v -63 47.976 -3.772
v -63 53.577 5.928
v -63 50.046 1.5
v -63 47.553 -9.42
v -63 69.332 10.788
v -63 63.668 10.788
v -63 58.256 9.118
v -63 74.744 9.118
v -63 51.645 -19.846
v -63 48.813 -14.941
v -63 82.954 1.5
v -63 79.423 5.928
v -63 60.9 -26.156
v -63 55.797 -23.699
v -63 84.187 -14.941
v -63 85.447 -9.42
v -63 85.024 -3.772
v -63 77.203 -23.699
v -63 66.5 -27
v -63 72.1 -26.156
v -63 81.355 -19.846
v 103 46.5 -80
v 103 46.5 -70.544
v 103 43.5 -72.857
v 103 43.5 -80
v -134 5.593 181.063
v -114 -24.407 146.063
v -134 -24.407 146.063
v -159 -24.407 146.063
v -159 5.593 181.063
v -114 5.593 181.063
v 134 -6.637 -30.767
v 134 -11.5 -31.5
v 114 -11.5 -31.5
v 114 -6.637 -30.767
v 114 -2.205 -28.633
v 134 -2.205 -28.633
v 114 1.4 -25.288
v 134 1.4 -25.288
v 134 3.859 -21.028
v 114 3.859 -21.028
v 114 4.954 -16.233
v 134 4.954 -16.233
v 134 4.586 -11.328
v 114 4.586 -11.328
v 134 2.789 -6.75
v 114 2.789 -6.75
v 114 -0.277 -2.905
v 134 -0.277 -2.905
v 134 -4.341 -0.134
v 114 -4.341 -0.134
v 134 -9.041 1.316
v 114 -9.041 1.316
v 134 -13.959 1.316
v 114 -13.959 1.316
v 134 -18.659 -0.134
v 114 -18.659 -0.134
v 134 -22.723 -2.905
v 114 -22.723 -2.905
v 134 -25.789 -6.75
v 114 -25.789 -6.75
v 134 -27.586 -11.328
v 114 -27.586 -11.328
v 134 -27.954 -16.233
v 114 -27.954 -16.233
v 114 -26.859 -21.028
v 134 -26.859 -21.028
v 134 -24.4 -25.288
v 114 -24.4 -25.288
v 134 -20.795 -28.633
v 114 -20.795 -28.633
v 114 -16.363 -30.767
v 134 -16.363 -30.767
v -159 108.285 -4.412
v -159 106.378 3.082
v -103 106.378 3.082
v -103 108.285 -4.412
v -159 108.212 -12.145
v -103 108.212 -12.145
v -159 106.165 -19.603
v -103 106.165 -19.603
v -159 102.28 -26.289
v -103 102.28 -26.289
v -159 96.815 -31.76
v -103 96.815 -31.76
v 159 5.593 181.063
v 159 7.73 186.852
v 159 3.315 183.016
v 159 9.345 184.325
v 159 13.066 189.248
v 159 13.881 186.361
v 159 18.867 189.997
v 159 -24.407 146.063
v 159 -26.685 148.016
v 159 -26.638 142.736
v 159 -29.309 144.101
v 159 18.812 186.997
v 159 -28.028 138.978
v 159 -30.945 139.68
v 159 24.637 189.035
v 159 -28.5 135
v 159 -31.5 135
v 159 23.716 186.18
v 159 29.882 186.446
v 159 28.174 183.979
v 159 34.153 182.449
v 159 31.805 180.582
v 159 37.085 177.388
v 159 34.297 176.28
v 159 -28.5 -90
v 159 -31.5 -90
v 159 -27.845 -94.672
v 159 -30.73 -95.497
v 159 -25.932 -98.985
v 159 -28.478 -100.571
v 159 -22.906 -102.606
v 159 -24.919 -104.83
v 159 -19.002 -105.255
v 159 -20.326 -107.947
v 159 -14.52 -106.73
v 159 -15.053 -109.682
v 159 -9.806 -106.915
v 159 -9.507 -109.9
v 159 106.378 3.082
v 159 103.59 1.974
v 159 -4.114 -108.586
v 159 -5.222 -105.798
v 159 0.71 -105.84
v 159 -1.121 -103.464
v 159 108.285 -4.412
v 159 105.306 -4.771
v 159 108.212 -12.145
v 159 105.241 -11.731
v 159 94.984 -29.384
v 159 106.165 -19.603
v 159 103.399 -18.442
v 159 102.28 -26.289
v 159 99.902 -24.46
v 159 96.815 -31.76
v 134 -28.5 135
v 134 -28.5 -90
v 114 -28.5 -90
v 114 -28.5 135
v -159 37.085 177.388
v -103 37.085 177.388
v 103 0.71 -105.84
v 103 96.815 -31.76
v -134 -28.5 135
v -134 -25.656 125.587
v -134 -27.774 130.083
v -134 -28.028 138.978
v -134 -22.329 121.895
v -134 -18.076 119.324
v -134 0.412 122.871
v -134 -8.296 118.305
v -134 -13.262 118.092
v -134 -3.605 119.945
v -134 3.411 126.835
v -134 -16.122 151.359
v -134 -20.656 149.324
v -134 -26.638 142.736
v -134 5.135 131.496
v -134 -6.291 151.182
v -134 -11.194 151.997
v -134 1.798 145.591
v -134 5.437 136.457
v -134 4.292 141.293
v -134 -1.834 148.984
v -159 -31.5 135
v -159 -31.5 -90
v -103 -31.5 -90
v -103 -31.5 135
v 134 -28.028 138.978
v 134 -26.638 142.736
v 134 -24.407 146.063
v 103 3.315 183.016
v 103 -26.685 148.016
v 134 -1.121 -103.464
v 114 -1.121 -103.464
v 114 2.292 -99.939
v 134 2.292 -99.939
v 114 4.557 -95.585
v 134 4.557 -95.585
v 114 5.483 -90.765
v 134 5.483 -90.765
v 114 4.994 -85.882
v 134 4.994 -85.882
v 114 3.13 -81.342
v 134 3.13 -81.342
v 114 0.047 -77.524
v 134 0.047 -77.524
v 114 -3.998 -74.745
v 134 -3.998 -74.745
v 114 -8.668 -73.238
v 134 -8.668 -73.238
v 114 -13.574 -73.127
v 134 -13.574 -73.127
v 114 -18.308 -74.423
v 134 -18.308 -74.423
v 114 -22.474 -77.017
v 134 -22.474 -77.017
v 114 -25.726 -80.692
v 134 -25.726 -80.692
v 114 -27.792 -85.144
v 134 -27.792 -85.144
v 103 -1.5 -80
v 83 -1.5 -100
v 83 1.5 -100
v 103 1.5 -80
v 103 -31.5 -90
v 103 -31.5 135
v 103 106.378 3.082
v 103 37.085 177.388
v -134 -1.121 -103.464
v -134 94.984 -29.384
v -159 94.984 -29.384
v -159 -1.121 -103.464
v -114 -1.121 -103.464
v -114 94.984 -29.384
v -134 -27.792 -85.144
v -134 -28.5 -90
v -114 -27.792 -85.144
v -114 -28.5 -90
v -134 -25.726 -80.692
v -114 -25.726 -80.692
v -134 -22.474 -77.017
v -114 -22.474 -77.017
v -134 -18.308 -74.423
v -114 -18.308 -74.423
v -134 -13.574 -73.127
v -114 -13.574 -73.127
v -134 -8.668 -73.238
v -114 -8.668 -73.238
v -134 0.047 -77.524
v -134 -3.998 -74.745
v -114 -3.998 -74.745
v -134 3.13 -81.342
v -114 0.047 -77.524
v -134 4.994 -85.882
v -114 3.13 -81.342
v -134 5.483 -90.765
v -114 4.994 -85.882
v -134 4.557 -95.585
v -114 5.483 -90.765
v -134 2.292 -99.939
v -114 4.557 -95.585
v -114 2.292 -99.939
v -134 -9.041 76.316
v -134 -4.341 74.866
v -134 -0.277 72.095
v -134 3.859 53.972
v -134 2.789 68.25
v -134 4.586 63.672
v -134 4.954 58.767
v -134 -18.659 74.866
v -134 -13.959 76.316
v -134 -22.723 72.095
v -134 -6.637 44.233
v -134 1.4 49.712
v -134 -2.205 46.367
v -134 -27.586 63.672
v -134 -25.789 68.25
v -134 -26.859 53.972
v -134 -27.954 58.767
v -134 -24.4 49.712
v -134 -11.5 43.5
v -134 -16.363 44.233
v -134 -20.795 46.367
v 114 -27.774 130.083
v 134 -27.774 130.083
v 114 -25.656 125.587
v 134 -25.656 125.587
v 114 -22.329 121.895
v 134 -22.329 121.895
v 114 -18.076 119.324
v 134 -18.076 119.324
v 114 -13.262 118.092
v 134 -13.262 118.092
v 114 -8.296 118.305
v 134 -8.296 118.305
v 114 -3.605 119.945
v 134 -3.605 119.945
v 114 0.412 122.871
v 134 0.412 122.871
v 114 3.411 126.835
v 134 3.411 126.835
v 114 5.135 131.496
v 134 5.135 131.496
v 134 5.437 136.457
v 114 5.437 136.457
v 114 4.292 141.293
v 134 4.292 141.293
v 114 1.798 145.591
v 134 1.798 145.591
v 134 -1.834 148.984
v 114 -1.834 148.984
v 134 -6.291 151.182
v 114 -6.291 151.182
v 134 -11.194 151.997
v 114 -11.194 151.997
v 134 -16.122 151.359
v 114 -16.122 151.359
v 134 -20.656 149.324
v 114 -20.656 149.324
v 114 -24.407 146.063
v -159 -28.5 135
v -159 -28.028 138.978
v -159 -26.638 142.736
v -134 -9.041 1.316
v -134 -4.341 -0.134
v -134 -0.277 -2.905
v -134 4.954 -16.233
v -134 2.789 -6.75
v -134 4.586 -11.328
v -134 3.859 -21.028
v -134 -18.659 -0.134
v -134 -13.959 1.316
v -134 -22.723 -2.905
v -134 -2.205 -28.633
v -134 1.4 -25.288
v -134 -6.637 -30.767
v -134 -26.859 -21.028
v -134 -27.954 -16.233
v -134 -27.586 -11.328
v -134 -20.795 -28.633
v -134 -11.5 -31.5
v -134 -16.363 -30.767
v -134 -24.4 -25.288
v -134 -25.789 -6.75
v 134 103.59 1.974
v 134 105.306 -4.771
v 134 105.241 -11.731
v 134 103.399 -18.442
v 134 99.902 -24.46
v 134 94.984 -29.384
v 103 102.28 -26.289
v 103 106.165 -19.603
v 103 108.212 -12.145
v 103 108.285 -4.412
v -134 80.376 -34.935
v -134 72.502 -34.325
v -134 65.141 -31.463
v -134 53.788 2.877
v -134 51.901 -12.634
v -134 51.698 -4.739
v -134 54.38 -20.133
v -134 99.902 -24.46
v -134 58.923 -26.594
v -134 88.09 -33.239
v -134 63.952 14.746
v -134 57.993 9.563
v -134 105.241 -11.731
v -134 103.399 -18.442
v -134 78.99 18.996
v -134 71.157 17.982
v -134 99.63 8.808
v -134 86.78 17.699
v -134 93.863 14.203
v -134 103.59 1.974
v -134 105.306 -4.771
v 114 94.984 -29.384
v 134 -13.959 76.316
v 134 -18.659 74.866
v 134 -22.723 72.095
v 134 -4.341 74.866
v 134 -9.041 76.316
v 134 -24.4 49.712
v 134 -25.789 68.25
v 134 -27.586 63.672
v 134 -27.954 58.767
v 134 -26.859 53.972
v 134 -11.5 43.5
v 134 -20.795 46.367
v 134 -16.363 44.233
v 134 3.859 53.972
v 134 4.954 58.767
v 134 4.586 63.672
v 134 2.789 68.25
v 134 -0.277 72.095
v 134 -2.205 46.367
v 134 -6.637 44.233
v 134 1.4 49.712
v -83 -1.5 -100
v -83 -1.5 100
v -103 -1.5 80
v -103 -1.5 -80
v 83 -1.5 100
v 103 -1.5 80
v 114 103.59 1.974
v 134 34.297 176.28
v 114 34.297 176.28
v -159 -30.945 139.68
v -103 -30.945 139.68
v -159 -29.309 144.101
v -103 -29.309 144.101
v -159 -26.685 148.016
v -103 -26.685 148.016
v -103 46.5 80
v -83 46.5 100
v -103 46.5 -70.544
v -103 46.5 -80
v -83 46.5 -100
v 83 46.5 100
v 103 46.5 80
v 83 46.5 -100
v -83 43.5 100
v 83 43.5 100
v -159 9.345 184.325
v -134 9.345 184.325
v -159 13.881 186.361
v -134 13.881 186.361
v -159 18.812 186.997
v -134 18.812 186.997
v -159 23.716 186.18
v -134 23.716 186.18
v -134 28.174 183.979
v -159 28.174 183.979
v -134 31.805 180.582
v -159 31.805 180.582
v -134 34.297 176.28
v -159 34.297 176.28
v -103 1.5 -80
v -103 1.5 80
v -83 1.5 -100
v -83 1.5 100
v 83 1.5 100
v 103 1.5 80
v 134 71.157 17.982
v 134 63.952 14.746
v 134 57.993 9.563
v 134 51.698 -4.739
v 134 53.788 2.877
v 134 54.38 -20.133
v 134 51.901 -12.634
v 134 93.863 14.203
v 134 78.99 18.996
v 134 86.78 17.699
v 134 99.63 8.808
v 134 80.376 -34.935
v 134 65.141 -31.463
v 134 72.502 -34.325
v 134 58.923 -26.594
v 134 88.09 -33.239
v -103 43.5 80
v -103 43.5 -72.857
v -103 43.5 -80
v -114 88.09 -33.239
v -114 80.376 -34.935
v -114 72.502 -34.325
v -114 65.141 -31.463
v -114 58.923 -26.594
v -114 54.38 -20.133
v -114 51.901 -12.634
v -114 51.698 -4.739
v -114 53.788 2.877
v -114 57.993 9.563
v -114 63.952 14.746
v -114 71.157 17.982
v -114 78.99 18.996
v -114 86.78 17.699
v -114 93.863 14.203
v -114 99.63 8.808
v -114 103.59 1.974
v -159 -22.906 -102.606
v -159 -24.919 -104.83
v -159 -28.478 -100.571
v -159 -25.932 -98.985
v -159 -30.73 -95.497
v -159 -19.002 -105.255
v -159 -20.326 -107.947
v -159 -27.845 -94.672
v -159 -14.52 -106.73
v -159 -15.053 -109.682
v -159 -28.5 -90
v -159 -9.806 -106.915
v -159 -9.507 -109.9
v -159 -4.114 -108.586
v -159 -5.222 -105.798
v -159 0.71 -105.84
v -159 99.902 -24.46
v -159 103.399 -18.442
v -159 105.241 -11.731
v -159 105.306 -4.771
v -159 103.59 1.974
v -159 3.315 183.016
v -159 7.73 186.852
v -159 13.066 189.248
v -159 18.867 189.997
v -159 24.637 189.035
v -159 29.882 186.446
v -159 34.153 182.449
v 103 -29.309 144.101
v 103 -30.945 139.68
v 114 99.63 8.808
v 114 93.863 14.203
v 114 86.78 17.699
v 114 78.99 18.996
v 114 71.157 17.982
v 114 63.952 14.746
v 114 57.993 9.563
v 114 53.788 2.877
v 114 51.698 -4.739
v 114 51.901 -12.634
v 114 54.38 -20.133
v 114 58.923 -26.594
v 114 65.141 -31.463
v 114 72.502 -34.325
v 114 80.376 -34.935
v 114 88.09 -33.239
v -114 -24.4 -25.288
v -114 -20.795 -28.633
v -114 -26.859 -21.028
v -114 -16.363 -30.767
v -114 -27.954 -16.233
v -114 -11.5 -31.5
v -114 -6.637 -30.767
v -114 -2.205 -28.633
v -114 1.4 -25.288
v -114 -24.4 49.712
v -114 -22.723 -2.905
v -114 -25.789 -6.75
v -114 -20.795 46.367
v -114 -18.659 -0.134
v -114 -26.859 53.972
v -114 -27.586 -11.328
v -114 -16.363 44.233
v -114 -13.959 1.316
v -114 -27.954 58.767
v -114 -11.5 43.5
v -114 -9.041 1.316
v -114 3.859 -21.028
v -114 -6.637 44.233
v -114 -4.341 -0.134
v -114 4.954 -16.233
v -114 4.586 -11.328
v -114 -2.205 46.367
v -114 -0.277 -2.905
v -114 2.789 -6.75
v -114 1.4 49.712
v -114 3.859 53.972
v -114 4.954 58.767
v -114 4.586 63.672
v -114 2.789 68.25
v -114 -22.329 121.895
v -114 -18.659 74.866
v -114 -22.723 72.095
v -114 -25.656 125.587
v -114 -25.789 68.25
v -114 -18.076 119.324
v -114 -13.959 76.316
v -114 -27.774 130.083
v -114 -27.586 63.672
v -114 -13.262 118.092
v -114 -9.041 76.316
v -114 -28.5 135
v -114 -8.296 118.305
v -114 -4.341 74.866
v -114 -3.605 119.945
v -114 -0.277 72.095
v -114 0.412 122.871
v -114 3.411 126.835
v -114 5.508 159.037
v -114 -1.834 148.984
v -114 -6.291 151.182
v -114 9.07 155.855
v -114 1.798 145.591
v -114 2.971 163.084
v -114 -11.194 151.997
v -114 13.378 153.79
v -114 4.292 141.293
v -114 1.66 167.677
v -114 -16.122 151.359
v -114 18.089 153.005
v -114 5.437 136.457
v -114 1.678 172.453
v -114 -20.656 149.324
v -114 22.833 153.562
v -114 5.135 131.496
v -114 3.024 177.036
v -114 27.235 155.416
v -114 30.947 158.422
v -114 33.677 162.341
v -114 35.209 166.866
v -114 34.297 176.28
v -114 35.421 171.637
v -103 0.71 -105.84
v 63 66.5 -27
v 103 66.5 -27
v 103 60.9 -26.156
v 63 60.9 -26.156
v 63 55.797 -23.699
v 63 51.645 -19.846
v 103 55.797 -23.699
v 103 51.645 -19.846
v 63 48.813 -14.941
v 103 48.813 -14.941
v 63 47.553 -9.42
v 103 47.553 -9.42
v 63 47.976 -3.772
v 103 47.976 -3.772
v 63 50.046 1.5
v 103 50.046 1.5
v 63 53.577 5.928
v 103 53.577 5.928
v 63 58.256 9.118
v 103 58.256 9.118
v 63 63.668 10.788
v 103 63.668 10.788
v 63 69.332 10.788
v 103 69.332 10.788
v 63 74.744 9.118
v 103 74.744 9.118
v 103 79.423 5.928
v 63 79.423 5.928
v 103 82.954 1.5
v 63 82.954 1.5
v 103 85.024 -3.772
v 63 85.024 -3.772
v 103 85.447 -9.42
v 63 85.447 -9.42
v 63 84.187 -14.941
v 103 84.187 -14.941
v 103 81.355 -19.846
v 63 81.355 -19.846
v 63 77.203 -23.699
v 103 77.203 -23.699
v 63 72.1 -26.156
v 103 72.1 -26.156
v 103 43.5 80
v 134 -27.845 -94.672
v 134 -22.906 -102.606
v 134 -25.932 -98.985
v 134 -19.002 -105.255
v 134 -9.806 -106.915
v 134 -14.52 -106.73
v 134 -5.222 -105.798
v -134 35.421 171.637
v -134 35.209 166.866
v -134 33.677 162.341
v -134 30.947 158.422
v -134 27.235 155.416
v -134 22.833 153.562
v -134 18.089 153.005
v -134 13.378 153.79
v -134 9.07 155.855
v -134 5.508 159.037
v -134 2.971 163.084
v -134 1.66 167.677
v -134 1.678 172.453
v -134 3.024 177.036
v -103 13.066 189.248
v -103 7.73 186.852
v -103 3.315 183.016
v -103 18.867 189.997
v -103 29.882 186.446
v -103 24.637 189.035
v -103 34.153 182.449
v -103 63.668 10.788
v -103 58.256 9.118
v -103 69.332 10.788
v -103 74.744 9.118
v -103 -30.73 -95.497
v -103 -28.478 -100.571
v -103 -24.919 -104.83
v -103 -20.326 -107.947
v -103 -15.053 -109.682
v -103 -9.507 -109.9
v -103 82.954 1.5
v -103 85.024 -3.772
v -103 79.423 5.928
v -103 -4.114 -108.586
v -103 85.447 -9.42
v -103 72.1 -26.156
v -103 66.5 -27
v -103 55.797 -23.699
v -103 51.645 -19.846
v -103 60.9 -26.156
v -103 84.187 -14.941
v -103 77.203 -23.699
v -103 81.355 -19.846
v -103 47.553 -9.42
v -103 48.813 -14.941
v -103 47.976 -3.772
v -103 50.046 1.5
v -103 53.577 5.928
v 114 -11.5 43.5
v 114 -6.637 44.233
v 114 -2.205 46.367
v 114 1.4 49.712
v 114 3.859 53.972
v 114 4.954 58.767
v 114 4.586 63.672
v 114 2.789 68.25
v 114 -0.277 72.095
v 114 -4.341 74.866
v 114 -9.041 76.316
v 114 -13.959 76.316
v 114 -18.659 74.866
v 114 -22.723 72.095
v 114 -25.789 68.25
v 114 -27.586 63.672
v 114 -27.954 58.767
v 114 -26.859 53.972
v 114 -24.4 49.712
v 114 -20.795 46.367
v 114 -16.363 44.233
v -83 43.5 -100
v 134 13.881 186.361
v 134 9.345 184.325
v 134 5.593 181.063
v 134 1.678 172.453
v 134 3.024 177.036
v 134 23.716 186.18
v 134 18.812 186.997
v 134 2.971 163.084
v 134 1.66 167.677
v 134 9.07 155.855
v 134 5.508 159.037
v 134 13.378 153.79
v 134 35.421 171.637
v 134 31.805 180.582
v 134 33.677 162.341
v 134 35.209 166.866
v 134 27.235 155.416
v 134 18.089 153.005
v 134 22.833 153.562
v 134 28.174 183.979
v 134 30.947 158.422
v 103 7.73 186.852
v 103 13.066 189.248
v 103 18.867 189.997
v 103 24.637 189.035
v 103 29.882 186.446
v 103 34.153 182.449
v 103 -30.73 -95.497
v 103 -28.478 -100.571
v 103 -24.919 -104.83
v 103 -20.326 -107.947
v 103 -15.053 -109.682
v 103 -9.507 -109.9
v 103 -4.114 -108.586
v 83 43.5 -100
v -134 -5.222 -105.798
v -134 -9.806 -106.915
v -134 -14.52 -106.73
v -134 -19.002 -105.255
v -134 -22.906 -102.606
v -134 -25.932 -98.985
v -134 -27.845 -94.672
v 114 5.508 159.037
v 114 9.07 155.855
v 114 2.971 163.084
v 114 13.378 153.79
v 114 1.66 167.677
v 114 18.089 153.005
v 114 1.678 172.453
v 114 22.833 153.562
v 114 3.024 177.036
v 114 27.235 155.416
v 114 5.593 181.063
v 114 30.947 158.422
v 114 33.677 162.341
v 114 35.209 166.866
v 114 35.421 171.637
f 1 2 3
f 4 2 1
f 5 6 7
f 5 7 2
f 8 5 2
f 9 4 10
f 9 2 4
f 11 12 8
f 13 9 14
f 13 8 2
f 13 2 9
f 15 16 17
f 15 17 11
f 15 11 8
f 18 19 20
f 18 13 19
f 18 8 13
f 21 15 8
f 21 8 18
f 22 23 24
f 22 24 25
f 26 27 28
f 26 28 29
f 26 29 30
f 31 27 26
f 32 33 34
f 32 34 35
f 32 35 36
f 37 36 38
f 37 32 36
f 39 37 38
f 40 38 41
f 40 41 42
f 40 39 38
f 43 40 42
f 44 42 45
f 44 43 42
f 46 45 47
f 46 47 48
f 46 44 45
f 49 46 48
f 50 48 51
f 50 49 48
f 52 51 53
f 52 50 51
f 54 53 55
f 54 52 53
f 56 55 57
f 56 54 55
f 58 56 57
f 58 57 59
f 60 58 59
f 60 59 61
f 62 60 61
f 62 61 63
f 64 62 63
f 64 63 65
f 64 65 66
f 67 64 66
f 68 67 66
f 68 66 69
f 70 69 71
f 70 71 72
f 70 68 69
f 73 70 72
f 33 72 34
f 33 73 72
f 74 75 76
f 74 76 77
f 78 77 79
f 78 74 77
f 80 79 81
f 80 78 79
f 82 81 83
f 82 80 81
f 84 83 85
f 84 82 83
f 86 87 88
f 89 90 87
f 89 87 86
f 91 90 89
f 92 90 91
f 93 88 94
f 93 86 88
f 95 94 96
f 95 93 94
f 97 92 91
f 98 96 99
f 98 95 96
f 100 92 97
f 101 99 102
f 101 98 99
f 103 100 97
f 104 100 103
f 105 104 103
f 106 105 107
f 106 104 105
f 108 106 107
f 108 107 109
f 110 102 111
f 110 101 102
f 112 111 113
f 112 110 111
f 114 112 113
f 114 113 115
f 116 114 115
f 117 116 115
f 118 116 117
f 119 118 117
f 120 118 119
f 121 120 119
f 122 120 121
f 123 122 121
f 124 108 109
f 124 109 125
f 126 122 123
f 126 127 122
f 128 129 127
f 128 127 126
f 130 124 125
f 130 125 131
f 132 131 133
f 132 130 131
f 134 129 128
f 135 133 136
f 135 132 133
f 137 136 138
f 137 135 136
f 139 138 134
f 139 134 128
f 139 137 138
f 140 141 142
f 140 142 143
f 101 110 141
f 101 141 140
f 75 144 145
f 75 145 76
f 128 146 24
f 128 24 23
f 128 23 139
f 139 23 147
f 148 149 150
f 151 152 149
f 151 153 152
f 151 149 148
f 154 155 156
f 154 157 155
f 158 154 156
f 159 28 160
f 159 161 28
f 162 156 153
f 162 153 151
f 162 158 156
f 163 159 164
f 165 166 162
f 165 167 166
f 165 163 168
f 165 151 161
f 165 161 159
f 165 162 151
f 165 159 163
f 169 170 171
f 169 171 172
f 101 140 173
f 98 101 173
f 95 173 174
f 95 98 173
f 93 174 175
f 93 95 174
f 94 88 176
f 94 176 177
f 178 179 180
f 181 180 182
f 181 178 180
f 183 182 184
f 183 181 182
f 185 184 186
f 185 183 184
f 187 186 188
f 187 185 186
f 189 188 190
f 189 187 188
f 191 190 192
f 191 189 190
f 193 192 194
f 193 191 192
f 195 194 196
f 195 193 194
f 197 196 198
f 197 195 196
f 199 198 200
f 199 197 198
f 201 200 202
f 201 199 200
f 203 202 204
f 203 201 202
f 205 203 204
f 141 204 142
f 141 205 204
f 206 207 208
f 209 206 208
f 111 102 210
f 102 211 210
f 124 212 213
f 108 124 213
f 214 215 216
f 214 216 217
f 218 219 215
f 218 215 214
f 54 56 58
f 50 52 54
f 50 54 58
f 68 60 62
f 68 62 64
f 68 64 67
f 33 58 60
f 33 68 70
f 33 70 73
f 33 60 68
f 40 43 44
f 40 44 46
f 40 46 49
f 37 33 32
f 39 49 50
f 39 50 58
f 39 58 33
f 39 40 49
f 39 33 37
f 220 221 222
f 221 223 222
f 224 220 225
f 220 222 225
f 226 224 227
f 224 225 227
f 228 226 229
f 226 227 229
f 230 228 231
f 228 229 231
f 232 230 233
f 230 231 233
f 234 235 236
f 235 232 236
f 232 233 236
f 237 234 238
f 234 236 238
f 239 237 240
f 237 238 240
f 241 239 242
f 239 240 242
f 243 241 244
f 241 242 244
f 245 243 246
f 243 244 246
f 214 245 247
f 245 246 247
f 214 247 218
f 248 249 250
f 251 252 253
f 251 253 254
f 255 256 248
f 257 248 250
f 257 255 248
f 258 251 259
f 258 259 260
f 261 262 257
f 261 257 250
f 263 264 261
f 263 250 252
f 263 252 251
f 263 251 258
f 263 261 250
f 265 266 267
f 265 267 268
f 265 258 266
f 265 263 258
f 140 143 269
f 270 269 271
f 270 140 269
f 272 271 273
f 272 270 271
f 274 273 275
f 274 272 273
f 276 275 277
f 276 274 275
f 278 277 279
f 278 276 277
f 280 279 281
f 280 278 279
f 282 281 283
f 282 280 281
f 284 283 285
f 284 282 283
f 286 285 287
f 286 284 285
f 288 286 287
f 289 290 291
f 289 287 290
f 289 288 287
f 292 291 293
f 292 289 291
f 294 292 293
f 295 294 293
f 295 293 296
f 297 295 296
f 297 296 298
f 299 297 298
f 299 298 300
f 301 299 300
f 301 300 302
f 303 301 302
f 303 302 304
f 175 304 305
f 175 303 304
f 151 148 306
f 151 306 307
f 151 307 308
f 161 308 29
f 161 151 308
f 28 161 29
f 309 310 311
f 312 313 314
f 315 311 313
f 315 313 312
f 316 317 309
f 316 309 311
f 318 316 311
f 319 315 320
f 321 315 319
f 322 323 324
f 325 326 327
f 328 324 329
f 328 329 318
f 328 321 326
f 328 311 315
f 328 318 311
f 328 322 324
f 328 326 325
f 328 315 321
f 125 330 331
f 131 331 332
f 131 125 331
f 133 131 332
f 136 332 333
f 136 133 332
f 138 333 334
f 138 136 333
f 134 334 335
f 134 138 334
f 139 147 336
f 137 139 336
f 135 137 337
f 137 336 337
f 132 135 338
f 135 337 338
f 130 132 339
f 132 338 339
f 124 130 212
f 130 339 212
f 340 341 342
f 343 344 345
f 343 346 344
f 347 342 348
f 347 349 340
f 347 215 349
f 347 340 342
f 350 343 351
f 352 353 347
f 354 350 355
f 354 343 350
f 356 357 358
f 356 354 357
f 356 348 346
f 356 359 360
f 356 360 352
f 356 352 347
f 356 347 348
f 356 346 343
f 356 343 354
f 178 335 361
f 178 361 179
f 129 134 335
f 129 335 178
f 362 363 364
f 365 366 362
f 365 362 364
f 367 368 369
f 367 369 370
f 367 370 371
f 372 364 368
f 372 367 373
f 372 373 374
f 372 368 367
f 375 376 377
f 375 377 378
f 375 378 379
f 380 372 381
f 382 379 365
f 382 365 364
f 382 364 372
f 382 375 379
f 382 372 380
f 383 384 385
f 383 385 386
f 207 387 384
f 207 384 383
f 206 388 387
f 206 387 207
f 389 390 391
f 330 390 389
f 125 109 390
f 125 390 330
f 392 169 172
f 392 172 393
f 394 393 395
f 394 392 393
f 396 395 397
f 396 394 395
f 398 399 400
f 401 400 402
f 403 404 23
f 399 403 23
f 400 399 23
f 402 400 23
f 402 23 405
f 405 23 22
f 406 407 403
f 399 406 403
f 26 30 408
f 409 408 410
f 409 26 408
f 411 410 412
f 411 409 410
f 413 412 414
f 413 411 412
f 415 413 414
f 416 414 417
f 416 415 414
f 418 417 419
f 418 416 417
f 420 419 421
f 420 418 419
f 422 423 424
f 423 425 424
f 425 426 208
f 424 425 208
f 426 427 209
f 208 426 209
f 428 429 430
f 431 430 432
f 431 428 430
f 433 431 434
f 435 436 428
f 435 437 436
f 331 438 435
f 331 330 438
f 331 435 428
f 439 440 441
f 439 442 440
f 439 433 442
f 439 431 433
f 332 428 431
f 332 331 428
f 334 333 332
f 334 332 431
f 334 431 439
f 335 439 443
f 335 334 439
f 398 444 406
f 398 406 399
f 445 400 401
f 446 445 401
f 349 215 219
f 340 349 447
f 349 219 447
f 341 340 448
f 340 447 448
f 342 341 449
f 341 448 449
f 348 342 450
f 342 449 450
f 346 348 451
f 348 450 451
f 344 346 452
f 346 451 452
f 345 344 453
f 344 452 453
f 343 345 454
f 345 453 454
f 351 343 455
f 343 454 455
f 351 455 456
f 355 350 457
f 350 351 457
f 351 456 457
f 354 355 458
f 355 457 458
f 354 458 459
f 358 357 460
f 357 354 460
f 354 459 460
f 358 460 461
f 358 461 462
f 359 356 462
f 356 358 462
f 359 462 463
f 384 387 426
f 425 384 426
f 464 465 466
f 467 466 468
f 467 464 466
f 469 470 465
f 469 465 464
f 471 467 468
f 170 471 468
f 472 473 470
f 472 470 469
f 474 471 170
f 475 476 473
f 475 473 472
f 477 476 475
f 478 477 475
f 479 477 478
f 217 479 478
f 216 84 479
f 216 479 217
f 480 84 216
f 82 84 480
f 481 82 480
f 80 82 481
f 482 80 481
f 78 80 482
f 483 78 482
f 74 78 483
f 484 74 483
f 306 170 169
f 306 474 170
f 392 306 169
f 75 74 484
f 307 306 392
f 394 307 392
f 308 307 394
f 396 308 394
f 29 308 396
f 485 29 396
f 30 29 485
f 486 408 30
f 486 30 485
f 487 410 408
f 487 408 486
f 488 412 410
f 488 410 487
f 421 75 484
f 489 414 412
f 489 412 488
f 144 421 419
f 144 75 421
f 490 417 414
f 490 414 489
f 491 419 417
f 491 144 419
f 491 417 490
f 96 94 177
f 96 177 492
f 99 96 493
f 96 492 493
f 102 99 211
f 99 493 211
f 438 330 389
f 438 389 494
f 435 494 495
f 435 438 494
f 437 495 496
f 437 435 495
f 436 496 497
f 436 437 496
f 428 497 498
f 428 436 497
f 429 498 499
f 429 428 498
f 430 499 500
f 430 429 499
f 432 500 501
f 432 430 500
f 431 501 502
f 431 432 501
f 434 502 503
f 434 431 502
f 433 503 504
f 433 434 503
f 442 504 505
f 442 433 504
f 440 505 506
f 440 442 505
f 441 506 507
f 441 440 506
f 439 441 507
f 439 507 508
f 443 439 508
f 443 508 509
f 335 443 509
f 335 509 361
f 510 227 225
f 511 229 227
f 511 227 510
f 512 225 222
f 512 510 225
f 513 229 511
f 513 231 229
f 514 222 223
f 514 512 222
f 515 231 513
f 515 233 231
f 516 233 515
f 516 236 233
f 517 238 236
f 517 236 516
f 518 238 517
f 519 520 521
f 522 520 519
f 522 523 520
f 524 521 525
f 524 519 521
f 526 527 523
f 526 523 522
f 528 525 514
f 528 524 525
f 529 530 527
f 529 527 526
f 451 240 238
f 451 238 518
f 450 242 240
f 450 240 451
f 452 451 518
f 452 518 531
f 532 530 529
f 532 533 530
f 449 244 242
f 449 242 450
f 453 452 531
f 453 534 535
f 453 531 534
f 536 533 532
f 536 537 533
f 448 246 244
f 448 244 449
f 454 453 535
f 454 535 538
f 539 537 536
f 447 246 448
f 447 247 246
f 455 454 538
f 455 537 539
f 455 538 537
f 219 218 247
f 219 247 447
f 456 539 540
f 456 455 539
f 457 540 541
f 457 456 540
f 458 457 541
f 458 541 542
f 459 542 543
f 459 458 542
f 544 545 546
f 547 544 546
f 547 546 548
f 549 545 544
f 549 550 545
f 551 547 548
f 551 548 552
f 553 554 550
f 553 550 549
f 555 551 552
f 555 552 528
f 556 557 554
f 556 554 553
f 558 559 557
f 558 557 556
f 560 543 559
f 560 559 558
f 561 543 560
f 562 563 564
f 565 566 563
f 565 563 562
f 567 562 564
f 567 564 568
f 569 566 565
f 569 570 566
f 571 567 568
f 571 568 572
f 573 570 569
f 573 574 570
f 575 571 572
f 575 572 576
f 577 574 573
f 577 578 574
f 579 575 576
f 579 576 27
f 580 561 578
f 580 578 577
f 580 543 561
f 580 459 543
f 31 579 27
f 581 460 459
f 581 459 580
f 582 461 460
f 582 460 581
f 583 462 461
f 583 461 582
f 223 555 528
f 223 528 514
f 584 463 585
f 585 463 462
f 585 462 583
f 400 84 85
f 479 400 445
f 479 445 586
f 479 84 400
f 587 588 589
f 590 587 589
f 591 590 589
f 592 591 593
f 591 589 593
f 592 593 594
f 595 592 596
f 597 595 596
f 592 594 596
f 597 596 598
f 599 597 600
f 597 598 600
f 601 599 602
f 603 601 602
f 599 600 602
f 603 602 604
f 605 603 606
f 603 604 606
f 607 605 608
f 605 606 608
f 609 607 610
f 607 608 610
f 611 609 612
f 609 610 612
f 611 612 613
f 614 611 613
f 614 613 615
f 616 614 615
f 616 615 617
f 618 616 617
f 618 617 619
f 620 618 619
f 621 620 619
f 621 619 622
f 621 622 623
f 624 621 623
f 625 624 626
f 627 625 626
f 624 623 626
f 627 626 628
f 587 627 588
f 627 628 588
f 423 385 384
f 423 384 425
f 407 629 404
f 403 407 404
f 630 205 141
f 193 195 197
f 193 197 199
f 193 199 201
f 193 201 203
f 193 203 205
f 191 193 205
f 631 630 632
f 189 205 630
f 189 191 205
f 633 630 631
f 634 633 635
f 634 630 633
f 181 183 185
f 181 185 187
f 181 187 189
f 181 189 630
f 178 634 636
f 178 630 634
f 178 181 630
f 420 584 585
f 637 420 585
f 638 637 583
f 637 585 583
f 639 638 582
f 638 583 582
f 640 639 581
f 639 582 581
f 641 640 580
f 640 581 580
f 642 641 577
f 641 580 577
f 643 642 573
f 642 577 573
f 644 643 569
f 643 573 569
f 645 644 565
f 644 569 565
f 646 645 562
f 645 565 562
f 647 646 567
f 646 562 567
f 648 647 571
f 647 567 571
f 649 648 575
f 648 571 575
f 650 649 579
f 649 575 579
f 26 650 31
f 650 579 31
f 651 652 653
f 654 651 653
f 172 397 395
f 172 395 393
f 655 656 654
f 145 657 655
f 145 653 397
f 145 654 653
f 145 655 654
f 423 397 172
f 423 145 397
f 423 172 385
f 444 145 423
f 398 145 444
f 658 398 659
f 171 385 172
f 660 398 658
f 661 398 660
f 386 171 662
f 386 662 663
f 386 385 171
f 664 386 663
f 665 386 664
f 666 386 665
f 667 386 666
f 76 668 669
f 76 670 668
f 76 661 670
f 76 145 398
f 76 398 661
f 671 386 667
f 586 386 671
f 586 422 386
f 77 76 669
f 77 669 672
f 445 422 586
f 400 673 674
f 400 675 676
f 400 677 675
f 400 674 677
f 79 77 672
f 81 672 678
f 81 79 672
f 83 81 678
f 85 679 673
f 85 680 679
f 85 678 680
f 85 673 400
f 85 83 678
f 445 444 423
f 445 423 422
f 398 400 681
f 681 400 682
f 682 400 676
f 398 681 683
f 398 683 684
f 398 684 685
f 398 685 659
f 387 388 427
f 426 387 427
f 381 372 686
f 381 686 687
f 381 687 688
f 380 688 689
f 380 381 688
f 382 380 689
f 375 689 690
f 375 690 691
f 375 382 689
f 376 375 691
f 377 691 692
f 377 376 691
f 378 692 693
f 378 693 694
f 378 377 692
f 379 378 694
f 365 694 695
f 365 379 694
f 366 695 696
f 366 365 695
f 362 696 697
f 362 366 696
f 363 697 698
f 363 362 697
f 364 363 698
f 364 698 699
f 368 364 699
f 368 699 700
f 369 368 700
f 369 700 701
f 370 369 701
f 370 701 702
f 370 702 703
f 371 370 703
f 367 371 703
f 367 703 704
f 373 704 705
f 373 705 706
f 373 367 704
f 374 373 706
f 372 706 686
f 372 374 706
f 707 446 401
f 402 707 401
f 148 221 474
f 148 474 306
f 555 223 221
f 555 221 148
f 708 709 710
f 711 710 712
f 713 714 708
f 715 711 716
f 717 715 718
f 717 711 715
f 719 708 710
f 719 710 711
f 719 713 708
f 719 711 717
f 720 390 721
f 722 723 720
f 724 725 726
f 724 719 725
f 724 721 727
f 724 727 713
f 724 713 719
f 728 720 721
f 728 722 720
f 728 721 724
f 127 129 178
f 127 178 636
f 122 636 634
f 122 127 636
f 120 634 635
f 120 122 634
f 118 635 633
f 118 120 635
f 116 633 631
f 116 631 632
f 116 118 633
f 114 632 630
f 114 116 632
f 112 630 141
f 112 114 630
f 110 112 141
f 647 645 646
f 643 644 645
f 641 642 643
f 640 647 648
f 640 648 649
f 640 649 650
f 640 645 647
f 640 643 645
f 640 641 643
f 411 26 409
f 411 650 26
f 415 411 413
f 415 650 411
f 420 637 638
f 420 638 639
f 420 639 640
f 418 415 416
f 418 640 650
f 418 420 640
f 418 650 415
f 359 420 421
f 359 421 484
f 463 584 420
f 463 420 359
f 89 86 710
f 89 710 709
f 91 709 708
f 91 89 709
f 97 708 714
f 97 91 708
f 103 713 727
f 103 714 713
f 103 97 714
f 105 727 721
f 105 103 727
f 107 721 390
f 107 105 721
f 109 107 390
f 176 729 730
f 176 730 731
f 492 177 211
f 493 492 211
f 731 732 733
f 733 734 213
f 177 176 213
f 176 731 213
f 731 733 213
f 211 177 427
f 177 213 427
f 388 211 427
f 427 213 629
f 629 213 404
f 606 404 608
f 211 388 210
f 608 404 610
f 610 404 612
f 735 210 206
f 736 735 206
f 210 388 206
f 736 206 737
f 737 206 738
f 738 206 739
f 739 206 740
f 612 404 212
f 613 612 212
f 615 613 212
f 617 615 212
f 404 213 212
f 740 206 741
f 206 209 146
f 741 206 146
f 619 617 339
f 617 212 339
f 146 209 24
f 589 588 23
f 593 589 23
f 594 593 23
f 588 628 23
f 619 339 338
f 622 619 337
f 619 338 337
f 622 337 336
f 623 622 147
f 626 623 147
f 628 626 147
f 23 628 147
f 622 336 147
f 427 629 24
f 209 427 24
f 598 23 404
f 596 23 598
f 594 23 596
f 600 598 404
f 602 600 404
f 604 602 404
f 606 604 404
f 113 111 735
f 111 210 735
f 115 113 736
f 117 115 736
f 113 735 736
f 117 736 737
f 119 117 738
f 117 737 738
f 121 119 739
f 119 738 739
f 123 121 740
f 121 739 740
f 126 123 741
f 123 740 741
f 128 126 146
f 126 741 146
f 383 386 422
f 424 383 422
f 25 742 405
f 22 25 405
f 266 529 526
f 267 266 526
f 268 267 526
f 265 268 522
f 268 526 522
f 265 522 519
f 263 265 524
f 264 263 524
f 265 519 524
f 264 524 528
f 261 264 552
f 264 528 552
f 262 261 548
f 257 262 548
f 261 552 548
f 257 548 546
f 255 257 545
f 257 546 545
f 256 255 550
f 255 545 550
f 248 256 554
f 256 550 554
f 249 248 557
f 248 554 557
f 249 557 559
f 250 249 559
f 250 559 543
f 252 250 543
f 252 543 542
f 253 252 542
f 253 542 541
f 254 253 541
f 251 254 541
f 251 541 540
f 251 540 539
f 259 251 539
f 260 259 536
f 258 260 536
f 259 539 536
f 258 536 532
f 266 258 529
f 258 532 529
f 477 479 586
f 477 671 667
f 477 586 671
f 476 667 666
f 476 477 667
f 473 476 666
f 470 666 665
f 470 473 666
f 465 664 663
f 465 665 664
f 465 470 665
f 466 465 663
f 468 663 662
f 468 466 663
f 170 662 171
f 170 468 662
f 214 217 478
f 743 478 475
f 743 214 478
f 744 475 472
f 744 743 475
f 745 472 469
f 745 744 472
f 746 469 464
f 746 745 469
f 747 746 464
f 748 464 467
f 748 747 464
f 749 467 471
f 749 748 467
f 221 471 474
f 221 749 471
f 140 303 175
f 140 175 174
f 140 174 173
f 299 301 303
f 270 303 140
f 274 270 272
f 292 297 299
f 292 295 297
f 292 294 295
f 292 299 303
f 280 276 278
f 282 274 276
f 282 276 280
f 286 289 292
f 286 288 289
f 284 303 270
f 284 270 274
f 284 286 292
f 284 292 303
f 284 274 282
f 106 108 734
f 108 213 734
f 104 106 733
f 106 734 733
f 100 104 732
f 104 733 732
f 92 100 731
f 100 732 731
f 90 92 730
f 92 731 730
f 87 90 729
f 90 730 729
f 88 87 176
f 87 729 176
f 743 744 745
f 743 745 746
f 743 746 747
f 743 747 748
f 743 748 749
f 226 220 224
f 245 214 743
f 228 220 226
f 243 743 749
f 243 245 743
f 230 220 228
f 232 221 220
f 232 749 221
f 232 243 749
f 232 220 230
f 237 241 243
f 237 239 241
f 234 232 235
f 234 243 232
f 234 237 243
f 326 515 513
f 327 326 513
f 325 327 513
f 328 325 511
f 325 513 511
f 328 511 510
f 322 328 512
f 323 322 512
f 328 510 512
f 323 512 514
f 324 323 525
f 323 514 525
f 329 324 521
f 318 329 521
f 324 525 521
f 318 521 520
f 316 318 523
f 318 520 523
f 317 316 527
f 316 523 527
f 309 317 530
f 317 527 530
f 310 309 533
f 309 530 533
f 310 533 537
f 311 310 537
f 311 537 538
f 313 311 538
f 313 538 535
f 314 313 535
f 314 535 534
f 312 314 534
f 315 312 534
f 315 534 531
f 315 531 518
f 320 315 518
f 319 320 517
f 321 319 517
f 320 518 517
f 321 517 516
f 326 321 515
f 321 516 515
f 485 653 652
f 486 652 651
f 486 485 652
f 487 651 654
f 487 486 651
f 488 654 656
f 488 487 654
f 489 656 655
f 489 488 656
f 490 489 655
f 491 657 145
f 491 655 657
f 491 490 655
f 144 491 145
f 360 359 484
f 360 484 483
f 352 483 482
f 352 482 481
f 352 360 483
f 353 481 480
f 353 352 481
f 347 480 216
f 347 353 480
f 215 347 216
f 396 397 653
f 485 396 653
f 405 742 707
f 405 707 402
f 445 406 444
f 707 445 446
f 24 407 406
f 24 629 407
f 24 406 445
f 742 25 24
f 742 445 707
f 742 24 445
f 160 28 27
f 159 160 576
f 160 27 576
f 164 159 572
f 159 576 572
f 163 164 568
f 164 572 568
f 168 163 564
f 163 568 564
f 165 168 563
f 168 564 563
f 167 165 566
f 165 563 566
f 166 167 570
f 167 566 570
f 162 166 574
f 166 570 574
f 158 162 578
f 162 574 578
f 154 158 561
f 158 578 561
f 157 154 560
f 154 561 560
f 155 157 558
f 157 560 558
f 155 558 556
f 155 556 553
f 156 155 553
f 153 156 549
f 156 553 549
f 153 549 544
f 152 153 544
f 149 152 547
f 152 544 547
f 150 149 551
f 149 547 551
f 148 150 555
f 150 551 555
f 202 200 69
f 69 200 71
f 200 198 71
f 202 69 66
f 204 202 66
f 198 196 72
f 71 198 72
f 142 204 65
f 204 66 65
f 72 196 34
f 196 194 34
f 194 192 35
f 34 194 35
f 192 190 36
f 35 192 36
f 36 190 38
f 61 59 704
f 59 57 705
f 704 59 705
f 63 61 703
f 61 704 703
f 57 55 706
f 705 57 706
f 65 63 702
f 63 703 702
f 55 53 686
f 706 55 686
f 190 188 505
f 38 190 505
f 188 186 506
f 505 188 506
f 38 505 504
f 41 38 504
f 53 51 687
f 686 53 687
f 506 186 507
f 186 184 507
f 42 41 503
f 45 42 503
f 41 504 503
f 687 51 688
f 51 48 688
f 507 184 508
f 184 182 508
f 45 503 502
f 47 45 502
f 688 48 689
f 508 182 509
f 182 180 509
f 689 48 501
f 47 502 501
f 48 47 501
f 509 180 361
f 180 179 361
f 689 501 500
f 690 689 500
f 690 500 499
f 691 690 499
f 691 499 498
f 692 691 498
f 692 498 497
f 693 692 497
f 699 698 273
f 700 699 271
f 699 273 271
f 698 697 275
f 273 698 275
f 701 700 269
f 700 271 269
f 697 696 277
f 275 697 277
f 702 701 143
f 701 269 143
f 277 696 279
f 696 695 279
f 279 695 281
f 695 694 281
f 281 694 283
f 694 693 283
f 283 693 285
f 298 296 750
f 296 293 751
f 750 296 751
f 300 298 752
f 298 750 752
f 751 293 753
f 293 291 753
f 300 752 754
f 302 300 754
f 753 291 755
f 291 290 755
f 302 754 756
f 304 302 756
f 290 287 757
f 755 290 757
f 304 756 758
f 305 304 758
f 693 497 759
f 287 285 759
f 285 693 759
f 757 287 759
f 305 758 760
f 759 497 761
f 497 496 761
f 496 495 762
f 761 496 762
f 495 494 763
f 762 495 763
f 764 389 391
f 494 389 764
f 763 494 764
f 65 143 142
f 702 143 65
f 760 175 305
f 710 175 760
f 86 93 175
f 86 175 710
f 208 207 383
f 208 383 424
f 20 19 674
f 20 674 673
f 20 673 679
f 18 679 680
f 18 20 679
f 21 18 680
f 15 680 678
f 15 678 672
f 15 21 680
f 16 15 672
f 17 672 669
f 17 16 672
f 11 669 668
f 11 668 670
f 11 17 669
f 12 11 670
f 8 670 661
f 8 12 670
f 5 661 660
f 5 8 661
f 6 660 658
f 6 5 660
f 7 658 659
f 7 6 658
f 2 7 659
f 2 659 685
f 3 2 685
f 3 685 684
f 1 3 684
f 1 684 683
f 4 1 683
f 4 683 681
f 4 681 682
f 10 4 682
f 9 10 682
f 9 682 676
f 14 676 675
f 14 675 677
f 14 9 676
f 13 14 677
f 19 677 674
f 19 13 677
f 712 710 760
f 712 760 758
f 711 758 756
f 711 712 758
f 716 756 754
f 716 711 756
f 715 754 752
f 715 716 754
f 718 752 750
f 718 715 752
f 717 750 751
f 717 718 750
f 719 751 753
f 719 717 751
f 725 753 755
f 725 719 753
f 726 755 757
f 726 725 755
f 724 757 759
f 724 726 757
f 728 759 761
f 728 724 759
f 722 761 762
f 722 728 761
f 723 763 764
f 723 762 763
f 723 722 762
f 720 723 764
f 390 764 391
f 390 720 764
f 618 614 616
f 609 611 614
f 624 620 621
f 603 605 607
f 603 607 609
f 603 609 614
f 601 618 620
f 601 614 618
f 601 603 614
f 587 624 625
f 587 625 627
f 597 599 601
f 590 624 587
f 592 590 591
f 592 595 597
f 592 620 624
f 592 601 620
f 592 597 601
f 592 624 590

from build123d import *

# Parameters (mm, degrees)
SKETCH_1_W          = 200
SKETCH_1_H          = 3
EXTRUDE_1_DEPTH     = 103
EXTRUDE_1_2_DEPTH   = 103
CHAMFER_1_SIZE      = 20
CHAMFER_2_SIZE      = 20
EXTRUDE_2_DEPTH     = 3
EXTRUDE_START       = 3
EXTRUDE_3_DEPTH     = 3
EXTRUDE_5_DEPTH     = 53
CUT_EXTRUDE_1_DEPTH = 45
EXTRUDE_START_2     = 53
EXTRUDE_6_DEPTH     = 53
CUT_EXTRUDE_START   = -45
CUT_EXTRUDE_3_DEPTH = 45
EXTRUDE_START_3     = 20
SKETCH_10_R         = 27
SKETCH_10_R_2       = 17
SKETCH_10_R_3       = 16.5
EXTRUDE_8_DEPTH     = 20
SKETCH_11_R         = 27
SKETCH_11_R_2       = 17
SKETCH_11_R_3       = 16.5
EXTRUDE_9_DEPTH     = 20
SKETCH_12_R         = 19
EXTRUDE_10_DEPTH    = 40
EXTRUDE_START_4     = 40
SKETCH_13_R         = 19
EXTRUDE_11_DEPTH    = 40


with BuildPart() as part:
    # 草图1 → 凸台-拉伸1 (new, symmetric)
    with BuildSketch(Plane(origin=(0, 0, 0), x_dir=(0, 0, -1), z_dir=(1, 0, 0))):
        Rectangle(SKETCH_1_W, SKETCH_1_H)
    extrude(amount=EXTRUDE_1_DEPTH, both=True)

    # 倒角2
    chamfer_2_edges = [part.edges().sort_by_distance(p)[0] for p in [
        (103, 0, 100),
        (103, 0, -100),
        (-103, 0, 100),
        (-103, 0, -100),
    ]]
    chamfer(chamfer_2_edges, length=CHAMFER_2_SIZE)



with BuildPart() as body_2:
    # 草图1 → Extrude 1 2 (new, symmetric)
    with BuildSketch(Plane(origin=(0, 0, 0), x_dir=(0, 0, -1), z_dir=(1, 0, 0))):
        with Locations((0, 45)):
            Rectangle(SKETCH_1_W, SKETCH_1_H)
    extrude(amount=EXTRUDE_1_2_DEPTH, both=True)

    # 倒角1
    chamfer_1_edges = [body_2.edges().sort_by_distance(p)[0] for p in [
        (103, 45, -100),
        (103, 45, 100),
        (-103, 45, -100),
        (-103, 45, 100),
    ]]
    chamfer(chamfer_1_edges, length=CHAMFER_1_SIZE)


with BuildPart() as part_1:
    add(part.part)

    add(body_2.part)  # 凸台-拉伸2 merges body 2
    # 草图2 → 凸台-拉伸2 (add)
    with BuildSketch(Plane(origin=(103, 0, 0), x_dir=(0, 0, -1), z_dir=(1, 0, 0))):
        with BuildLine():
            Line((105.840291615, 0.710043471), (31.760437422, 96.815065207))
            ThreePointArc((31.760437422, 96.815065207), (15.940085812, 107.430175203), (-3.082450225, 106.377935666))
            Line((-3.082450225, 106.377935666), (-177.38830015, 37.085290444))
            ThreePointArc((-177.38830015, 37.085290444), (-189.727961496, 21.787481591), (-183.015827469, 3.314867953))
            Line((-183.015827469, 3.314867953), (-148.015827469, -26.685132047))
            ThreePointArc((-148.015827469, -26.685132047), (-141.938924955, -30.257700298), (-135, -31.5))
            Line((-135, -31.5), (90, -31.5))
            ThreePointArc((90, -31.5), (107.947156731, -20.326073039), (105.840291615, 0.710043471))
        make_face()
    extrude(amount=EXTRUDE_2_DEPTH)

    # 草图3 → 凸台-拉伸3 (add)
    with BuildSketch(Plane.ZY.offset(103).offset(EXTRUDE_START)):
        with BuildLine():
            Line((-105.840291615, 0.710043471), (-31.760437422, 96.815065207))
            ThreePointArc((-31.760437422, 96.815065207), (-15.940085812, 107.430175203), (3.082450225, 106.377935666))
            Line((3.082450225, 106.377935666), (177.38830015, 37.085290444))
            ThreePointArc((177.38830015, 37.085290444), (189.727961496, 21.787481591), (183.015827469, 3.314867953))
            Line((183.015827469, 3.314867953), (148.015827469, -26.685132047))
            ThreePointArc((148.015827469, -26.685132047), (141.938924955, -30.257700298), (135, -31.5))
            Line((135, -31.5), (-90, -31.5))
            ThreePointArc((-90, -31.5), (-107.947156731, -20.326073039), (-105.840291615, 0.710043471))
        make_face()
    extrude(amount=-EXTRUDE_3_DEPTH)

    # 草图4 → 凸台-拉伸5 (add)
    with BuildSketch(Plane(origin=(106, 0, 0), x_dir=(0, 0, -1), z_dir=(1, 0, 0))):
        with BuildLine():
            Line((-3.082450225, 106.377935666), (-177.38830015, 37.085290444))
            ThreePointArc((-177.38830015, 37.085290444), (-189.727961496, 21.787481591), (-183.015827469, 3.314867953))
            Line((-183.015827469, 3.314867953), (-148.015827469, -26.685132047))
            ThreePointArc((-148.015827469, -26.685132047), (-141.938924955, -30.257700298), (-135, -31.5))
            Line((-135, -31.5), (90, -31.5))
            ThreePointArc((90, -31.5), (107.947156731, -20.326073039), (105.840291615, 0.710043471))
            Line((105.840291615, 0.710043471), (31.760437422, 96.815065207))
            ThreePointArc((31.760437422, 96.815065207), (15.940085812, 107.430175203), (-3.082450225, 106.377935666))
        make_face()
    extrude(amount=EXTRUDE_5_DEPTH)

    # 草图6 → 切除-拉伸1 (cut)
    with BuildSketch(Plane(origin=(159, 0, 0), x_dir=(0, 0, -1), z_dir=(1, 0, 0))):
        with BuildLine():
            Line((-176.280055127, 34.297496878), (-1.974205202, 103.5901421))
            ThreePointArc((-1.974205202, 103.5901421), (15.146077231, 104.537157683), (29.38439368, 94.983558686))
            Line((29.38439368, 94.983558686), (103.464247872, -1.12146305))
            ThreePointArc((103.464247872, -1.12146305), (105.255083221, -19.002162083), (90, -28.5))
            Line((90, -28.5), (-135, -28.5))
            ThreePointArc((-135, -28.5), (-140.898086211, -27.444045253), (-146.063453349, -24.40736224))
            Line((-146.063453349, -24.40736224), (-181.063453349, 5.59263776))
            ThreePointArc((-181.063453349, 5.59263776), (-186.768767272, 21.294359353), (-176.280055127, 34.297496878))
        make_face()
    extrude(amount=-CUT_EXTRUDE_1_DEPTH, mode=Mode.SUBTRACT)

    # 草图8 → 凸台-拉伸6 (add)
    with BuildSketch(Plane.ZY.offset(106).offset(EXTRUDE_START_2)):
        with BuildLine():
            Line((-31.760437422, 96.815065207), (-105.840291615, 0.710043471))
            ThreePointArc((-105.840291615, 0.710043471), (-107.947156731, -20.326073039), (-90, -31.5))
            Line((-90, -31.5), (135, -31.5))
            ThreePointArc((135, -31.5), (141.938924955, -30.257700298), (148.015827469, -26.685132047))
            Line((148.015827469, -26.685132047), (183.015827469, 3.314867953))
            ThreePointArc((183.015827469, 3.314867953), (189.727961496, 21.787481591), (177.38830015, 37.085290444))
            Line((177.38830015, 37.085290444), (3.082450225, 106.377935666))
            ThreePointArc((3.082450225, 106.377935666), (-15.940085812, 107.430175203), (-31.760437422, 96.815065207))
        make_face()
    extrude(amount=-EXTRUDE_6_DEPTH)

    # 草图9 → 切除-拉伸3 (cut)
    with BuildSketch(Plane.ZY.offset(159).offset(CUT_EXTRUDE_START)):
        with BuildLine():
            Line((-29.38439368, 94.983558686), (-103.464247872, -1.12146305))
            ThreePointArc((-103.464247872, -1.12146305), (-105.255083221, -19.002162083), (-90, -28.5))
            Line((-90, -28.5), (135, -28.5))
            ThreePointArc((135, -28.5), (140.898086211, -27.444045253), (146.063453349, -24.40736224))
            Line((146.063453349, -24.40736224), (181.063453349, 5.59263776))
            ThreePointArc((181.063453349, 5.59263776), (186.768767272, 21.294359353), (176.280055127, 34.297496878))
            Line((176.280055127, 34.297496878), (1.974205202, 103.5901421))
            ThreePointArc((1.974205202, 103.5901421), (-15.146077231, 104.537157683), (-29.38439368, 94.983558686))
        make_face()
    extrude(amount=CUT_EXTRUDE_3_DEPTH, mode=Mode.SUBTRACT)

    # 草图10 → 凸台-拉伸8 (add)
    with BuildSketch(Plane(origin=(114, 0, 0), x_dir=(0, 0, -1), z_dir=(1, 0, 0)).offset(EXTRUDE_START_3)):
        with Locations((8, 78.5)):
            Circle(SKETCH_10_R)
        with Locations((-170, 18.5)):
            Circle(SKETCH_10_R_2)
        with Locations((-135, -11.5)):
            Circle(SKETCH_10_R_2)
        with Locations((-60, -11.5)):
            Circle(SKETCH_10_R_3)
        with Locations((15, -11.5)):
            Circle(SKETCH_10_R_3)
        with Locations((90, -11.5)):
            Circle(SKETCH_10_R_2)
    extrude(amount=-EXTRUDE_8_DEPTH)

    # 草图11 → 凸台-拉伸9 (add)
    with BuildSketch(Plane.ZY.offset(114)):
        with Locations((-8, 78.5)):
            Circle(SKETCH_11_R)
        with Locations((-90, -11.5)):
            Circle(SKETCH_11_R_2)
        with Locations(Location((-15, -11.5, 0), (0, 0, 180))):
            Circle(SKETCH_11_R_3)
        with Locations(Location((60, -11.5, 0), (0, 0, 180))):
            Circle(SKETCH_11_R_3)
        with Locations((135, -11.5)):
            Circle(SKETCH_11_R_2)
        with Locations((170, 18.5)):
            Circle(SKETCH_11_R_2)
    extrude(amount=EXTRUDE_9_DEPTH)

    # 草图12 → 凸台-拉伸10 (add)
    with BuildSketch(Plane.ZY.offset(-103)):
        with Locations(Location((-8, 66.5, 0), (0, 0, 180))):
            Circle(SKETCH_12_R)
    extrude(amount=EXTRUDE_10_DEPTH)

    # 草图13 → 凸台-拉伸11 (add)
    with BuildSketch(Plane(origin=(-103, 0, 0), x_dir=(0, 0, -1), z_dir=(1, 0, 0)).offset(EXTRUDE_START_4)):
        with Locations((8, 66.5)):
            Circle(SKETCH_13_R)
    extrude(amount=-EXTRUDE_11_DEPTH)


solid = part_1.part
